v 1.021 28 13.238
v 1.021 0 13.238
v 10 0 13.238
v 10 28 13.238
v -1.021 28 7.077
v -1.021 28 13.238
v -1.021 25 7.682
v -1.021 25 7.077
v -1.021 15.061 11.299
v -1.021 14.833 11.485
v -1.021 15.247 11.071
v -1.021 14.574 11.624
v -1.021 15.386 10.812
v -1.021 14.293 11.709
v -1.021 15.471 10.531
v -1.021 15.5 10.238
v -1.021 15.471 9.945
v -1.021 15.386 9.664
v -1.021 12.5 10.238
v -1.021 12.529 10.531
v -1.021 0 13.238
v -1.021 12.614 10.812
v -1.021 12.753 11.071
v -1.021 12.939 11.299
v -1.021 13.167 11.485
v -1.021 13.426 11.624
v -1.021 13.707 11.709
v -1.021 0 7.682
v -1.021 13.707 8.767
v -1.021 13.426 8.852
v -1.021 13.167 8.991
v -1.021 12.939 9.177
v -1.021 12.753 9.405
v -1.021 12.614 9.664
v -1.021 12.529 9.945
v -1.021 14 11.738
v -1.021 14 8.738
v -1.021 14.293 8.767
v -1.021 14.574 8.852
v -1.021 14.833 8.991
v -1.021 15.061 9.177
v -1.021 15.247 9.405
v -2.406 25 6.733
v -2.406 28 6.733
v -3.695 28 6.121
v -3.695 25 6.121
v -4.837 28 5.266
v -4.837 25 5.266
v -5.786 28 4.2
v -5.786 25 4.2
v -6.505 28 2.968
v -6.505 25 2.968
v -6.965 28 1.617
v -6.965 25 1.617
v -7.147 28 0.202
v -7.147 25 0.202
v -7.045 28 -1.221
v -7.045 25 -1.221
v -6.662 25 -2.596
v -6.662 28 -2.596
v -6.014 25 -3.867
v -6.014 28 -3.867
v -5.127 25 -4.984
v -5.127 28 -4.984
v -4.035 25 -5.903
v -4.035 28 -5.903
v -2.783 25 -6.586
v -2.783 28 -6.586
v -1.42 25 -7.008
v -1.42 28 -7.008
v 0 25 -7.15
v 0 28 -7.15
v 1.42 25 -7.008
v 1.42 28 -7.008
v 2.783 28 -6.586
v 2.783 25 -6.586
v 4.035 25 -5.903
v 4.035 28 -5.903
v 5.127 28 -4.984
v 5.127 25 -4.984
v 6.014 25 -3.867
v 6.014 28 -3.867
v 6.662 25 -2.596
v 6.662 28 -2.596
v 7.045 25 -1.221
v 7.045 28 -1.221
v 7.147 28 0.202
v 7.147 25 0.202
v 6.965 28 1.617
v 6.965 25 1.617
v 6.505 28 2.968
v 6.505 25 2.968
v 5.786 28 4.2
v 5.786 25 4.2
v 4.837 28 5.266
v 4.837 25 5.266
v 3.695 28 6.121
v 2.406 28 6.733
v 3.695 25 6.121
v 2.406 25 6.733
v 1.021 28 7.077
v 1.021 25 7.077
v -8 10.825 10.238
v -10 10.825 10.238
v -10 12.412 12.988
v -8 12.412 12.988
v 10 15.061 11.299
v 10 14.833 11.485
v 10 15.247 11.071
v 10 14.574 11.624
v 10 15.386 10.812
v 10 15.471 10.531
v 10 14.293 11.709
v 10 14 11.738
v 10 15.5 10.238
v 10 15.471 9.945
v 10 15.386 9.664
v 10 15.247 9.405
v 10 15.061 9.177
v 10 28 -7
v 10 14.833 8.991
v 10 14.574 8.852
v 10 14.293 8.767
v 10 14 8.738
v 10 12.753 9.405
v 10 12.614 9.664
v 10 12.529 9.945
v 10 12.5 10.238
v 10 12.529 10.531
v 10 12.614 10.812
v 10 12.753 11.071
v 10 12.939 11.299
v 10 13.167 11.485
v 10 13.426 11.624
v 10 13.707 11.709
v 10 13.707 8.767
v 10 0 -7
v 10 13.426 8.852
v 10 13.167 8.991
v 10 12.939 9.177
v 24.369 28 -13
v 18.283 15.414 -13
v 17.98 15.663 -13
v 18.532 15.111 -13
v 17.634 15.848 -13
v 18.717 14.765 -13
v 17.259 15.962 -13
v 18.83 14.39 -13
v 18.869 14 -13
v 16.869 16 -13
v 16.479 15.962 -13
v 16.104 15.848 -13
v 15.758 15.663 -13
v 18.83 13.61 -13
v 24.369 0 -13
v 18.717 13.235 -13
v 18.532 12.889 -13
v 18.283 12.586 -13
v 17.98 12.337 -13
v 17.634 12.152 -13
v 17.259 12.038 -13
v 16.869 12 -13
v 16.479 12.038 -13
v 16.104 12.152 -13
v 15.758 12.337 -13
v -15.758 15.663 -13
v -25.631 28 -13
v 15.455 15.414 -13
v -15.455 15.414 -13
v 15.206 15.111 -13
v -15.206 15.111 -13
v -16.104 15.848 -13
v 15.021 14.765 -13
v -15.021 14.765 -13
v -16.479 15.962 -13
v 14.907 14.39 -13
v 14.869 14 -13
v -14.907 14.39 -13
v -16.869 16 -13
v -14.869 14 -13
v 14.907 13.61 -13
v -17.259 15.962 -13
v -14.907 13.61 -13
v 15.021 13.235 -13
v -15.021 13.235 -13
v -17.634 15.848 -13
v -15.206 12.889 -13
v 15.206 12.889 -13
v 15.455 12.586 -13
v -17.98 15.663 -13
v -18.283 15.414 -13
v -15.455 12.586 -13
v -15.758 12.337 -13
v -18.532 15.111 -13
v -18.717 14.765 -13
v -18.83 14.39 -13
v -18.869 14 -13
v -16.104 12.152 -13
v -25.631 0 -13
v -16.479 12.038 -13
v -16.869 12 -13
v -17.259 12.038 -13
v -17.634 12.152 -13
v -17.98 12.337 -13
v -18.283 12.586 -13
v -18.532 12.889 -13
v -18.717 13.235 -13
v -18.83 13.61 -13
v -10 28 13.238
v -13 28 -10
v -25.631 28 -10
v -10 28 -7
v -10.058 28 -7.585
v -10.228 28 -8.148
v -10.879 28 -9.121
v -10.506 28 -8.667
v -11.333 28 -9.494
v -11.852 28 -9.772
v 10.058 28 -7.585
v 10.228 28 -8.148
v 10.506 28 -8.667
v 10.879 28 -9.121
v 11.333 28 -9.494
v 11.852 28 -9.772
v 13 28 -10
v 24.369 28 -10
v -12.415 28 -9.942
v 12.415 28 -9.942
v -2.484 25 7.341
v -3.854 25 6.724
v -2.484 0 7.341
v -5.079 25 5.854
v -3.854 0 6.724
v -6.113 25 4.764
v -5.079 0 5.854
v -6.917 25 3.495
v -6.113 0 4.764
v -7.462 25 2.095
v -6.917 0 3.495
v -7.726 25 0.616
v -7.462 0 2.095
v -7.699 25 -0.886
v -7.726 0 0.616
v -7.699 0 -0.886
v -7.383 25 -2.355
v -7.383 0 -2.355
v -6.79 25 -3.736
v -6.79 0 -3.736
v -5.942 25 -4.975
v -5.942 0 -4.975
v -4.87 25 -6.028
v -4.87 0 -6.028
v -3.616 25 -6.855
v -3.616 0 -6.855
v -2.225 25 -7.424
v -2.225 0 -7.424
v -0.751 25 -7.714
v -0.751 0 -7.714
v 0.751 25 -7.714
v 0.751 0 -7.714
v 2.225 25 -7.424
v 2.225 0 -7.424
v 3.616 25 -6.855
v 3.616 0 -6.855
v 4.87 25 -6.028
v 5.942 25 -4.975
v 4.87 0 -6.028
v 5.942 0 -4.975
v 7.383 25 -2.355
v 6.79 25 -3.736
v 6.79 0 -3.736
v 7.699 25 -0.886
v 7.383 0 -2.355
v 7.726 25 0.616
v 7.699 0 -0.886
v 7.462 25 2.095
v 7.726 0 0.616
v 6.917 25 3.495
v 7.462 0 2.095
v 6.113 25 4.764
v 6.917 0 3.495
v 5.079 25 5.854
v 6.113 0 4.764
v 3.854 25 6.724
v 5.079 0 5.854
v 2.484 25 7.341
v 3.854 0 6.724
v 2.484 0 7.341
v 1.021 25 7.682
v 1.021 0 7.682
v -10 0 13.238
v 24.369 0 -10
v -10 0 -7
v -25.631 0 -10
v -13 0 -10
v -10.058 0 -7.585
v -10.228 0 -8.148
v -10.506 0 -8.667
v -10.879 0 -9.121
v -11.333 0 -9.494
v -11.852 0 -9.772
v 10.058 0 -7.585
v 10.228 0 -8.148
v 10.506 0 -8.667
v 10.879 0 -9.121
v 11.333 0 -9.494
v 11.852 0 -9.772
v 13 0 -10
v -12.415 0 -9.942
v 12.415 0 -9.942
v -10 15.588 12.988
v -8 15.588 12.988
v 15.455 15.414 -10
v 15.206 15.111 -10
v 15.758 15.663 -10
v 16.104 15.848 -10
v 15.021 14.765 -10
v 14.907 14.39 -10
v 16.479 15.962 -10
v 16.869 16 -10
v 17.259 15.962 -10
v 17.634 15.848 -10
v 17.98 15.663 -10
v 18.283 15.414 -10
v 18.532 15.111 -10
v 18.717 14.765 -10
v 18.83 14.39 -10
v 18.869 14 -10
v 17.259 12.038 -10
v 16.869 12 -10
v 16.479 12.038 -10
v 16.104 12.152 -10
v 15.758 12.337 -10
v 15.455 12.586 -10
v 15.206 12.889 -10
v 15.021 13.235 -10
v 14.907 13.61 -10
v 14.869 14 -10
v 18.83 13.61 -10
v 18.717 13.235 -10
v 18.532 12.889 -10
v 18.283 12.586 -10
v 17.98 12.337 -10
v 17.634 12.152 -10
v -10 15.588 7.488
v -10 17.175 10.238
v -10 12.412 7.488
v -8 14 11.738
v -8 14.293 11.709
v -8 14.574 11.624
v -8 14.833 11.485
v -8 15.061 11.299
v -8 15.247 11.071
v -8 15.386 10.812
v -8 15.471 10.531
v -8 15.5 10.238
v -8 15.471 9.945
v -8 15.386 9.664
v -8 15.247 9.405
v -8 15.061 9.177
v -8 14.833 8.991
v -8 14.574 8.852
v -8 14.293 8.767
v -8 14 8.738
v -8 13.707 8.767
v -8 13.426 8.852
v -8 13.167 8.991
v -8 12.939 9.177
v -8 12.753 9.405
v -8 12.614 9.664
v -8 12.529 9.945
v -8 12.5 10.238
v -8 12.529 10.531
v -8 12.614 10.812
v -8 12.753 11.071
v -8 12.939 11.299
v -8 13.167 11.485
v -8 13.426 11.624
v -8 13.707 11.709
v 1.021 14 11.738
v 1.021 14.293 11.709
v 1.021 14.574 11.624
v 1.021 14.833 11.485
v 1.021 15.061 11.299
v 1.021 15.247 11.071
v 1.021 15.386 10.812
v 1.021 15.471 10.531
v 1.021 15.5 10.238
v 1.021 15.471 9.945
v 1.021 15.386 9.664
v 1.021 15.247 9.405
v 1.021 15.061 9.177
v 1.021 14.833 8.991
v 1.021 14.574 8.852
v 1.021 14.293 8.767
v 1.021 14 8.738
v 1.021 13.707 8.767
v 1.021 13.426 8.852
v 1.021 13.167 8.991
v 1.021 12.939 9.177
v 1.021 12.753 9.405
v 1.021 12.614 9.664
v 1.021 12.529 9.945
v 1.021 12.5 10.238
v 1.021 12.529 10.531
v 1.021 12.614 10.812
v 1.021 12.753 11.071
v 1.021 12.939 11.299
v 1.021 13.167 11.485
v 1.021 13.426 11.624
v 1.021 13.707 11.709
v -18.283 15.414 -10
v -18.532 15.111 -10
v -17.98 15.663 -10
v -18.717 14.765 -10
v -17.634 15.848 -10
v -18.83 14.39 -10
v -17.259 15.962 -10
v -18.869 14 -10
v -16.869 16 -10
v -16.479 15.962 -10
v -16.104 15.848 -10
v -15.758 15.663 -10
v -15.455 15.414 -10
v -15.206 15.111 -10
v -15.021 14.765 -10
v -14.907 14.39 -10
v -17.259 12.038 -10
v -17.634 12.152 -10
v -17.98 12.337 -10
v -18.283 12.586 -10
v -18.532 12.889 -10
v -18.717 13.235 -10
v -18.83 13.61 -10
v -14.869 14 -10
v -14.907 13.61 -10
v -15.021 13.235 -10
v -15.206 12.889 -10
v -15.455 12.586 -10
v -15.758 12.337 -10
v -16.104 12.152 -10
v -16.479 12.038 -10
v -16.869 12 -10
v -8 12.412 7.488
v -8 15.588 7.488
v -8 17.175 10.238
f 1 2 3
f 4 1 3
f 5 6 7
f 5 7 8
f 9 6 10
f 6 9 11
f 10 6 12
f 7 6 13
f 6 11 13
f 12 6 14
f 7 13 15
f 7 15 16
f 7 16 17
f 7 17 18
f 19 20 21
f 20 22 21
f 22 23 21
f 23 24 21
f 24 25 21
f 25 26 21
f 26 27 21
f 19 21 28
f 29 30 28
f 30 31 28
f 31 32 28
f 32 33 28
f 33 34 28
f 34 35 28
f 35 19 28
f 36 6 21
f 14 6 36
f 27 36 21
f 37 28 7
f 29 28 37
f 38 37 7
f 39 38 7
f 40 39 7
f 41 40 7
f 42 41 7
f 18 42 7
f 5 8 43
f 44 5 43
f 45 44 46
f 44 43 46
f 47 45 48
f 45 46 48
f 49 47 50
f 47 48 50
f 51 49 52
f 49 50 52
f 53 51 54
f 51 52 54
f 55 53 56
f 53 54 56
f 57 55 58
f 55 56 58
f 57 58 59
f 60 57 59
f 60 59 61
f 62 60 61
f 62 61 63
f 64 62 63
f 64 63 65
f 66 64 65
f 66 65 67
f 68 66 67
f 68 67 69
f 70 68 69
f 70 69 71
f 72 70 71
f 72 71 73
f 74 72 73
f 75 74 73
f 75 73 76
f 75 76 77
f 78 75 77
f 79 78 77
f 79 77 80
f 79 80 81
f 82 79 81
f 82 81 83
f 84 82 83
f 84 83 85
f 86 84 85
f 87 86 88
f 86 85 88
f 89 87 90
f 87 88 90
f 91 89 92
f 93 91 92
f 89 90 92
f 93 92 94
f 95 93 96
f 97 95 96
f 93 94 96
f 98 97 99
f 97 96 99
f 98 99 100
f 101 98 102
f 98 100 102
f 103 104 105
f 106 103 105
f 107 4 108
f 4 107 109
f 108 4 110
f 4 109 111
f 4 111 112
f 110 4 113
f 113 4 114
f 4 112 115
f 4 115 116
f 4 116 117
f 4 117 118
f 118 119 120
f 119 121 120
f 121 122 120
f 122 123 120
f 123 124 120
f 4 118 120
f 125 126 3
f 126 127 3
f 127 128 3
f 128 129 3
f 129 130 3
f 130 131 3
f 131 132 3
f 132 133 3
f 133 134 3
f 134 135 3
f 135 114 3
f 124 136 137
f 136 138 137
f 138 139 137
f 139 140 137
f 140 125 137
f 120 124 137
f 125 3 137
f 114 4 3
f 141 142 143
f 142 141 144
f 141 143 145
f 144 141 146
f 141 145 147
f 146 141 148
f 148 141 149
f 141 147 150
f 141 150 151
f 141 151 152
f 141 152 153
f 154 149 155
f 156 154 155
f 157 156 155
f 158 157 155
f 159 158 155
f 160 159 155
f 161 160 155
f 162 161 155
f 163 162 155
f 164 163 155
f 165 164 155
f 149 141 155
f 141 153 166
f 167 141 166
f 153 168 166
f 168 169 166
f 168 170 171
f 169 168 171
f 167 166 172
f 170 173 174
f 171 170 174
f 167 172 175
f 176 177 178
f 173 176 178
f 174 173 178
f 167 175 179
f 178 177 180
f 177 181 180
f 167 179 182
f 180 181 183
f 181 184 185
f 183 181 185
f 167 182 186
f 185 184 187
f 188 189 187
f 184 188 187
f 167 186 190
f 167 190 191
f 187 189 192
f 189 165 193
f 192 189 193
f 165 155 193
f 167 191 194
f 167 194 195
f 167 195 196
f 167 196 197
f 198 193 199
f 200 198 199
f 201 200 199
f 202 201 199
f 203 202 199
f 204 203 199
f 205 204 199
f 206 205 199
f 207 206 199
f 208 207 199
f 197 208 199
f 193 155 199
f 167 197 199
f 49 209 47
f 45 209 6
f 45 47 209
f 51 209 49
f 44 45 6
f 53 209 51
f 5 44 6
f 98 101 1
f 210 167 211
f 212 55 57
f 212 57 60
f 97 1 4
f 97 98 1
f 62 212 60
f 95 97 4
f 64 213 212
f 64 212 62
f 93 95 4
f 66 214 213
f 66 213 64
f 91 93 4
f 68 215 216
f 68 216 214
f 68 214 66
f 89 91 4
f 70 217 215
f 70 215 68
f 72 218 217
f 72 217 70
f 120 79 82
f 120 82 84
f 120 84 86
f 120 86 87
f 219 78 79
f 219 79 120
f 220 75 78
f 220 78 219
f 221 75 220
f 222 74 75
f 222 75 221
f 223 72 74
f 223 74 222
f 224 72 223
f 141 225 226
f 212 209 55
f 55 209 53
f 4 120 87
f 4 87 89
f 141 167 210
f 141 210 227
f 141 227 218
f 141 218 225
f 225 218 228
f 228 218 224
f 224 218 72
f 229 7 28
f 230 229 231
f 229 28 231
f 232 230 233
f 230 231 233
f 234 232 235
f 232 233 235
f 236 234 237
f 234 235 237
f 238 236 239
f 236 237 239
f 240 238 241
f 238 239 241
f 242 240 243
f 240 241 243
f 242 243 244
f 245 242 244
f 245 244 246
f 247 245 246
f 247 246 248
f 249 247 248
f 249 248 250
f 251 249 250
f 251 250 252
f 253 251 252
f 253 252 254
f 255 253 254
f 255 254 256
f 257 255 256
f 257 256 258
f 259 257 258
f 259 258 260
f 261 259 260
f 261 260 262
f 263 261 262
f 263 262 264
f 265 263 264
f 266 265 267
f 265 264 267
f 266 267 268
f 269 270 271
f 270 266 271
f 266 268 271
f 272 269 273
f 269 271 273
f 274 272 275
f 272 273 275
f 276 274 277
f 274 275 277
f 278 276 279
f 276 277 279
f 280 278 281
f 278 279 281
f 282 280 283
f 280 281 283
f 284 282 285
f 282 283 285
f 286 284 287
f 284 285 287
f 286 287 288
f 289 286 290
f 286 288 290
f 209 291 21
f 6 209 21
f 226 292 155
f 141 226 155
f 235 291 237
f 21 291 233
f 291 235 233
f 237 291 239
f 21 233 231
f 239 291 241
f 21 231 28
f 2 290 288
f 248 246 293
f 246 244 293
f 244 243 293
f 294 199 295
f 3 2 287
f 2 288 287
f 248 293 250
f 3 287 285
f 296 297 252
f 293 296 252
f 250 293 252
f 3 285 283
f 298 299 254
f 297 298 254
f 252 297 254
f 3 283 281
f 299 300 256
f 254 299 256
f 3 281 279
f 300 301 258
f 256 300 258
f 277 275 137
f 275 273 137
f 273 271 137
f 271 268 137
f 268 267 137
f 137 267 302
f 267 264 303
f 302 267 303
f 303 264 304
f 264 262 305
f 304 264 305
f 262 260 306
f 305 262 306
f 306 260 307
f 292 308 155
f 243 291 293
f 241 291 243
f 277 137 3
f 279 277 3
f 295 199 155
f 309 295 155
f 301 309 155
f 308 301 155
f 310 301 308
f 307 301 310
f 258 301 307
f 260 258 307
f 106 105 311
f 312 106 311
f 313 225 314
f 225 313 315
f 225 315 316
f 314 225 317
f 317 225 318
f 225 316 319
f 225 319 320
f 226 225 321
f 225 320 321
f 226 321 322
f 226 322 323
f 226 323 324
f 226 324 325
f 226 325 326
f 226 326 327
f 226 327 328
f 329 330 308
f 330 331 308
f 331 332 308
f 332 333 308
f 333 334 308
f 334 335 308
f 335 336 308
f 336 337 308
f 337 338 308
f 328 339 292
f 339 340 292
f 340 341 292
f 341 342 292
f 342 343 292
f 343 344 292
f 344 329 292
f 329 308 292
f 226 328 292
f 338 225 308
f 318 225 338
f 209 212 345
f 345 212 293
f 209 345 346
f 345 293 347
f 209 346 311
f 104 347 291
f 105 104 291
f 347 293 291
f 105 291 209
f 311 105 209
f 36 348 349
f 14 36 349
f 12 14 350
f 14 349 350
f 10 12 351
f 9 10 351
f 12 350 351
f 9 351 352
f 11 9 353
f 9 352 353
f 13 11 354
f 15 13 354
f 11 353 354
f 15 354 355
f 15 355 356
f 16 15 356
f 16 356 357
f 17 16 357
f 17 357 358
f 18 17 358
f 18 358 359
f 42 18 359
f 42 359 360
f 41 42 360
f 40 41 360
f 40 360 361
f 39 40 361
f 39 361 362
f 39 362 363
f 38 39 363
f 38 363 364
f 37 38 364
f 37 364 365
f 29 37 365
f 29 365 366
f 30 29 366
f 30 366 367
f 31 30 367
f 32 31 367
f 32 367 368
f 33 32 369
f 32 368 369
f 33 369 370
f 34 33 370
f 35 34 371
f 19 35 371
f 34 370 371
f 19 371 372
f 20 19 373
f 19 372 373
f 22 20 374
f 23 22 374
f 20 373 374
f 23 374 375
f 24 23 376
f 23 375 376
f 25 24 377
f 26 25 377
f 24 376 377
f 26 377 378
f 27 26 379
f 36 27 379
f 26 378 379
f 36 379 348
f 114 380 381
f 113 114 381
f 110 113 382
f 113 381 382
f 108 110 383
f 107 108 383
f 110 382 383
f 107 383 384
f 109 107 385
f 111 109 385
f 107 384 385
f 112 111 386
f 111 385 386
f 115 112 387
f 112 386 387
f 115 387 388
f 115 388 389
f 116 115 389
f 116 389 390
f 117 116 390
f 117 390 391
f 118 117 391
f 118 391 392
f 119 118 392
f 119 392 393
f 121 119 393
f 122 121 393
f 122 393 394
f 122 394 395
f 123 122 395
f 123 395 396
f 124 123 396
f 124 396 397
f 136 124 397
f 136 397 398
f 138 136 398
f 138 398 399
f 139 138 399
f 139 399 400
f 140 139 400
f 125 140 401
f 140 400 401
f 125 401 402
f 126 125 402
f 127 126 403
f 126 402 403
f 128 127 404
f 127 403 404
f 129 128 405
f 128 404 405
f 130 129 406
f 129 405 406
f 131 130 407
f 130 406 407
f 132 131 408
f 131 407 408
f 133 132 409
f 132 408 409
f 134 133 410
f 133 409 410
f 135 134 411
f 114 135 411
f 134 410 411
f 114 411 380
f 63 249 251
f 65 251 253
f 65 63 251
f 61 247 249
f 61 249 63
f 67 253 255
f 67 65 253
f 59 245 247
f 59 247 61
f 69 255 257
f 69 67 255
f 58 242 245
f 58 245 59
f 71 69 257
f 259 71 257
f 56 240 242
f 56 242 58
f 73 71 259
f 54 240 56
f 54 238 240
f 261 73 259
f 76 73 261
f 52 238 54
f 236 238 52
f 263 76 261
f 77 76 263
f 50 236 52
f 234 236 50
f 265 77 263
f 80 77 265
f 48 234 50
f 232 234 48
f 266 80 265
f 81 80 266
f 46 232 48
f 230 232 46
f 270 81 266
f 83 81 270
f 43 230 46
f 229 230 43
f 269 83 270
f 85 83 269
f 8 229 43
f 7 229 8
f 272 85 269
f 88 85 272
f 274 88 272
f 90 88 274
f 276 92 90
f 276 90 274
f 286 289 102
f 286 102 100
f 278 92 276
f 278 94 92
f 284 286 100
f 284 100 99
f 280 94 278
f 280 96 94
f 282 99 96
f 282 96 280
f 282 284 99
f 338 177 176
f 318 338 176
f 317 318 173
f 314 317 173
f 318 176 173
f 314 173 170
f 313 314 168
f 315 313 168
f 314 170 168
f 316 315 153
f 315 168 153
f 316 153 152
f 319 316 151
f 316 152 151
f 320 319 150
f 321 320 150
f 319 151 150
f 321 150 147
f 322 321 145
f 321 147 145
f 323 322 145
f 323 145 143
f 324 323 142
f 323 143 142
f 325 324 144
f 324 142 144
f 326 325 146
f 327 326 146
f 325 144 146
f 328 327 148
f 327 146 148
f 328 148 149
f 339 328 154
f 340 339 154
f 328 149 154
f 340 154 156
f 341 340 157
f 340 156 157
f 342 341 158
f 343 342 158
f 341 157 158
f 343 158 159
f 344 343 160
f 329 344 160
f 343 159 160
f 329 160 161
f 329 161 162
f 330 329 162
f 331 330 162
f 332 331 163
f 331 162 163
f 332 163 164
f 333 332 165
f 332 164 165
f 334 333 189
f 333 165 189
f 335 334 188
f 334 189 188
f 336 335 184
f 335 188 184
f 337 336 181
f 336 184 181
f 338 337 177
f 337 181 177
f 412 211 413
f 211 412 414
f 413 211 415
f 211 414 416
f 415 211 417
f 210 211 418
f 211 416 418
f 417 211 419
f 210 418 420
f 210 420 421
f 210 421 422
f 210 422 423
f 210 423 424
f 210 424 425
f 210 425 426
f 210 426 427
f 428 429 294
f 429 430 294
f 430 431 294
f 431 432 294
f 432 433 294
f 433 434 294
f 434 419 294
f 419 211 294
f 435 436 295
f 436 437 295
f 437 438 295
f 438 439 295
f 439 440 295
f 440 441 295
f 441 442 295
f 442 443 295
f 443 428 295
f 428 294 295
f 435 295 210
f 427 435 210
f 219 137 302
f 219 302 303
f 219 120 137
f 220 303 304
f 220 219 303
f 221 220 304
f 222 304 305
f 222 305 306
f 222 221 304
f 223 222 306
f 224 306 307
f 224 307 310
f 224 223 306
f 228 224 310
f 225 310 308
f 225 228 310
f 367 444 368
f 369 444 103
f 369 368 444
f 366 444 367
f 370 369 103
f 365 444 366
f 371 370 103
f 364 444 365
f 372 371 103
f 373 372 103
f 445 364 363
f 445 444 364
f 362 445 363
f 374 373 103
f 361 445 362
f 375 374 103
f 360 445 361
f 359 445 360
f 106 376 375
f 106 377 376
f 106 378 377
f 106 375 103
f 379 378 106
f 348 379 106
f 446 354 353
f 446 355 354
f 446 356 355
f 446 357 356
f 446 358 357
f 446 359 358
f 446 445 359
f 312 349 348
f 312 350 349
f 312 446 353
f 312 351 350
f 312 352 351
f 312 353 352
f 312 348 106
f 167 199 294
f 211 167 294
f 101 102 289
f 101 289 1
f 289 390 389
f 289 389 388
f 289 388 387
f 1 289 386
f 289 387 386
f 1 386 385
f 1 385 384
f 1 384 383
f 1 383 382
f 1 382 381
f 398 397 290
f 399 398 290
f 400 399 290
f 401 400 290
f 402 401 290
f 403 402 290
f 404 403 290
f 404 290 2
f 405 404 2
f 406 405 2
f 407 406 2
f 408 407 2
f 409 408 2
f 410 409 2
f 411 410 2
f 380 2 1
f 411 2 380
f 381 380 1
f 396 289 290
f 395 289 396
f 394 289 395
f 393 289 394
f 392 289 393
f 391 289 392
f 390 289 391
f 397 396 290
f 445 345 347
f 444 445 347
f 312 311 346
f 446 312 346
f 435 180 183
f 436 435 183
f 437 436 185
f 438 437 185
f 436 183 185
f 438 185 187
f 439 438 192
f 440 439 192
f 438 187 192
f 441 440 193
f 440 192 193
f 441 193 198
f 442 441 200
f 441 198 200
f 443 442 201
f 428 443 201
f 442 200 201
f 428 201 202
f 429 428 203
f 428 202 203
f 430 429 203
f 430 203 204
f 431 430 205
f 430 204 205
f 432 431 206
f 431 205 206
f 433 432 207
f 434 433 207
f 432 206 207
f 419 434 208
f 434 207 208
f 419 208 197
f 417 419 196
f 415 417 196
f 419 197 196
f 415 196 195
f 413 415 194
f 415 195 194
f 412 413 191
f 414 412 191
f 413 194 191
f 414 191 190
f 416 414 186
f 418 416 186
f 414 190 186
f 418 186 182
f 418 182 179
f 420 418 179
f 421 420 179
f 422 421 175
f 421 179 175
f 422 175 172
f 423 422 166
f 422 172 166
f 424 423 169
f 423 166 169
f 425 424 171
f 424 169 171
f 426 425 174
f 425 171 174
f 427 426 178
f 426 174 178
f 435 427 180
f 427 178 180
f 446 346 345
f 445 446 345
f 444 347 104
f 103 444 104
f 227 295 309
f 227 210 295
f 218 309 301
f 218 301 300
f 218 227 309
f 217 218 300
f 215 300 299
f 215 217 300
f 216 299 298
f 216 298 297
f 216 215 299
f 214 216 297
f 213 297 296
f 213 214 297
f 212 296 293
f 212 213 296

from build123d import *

# Parameters (mm, degrees)
BOSS_EXTRUDE1_DEPTH = 28
SKETCH2_R           = 1.5
CUT_EXTRUDE1_DEPTH  = 20
CUT_EXTRUDE2_DEPTH  = 2
SKETCH4_R           = 2
CUT_EXTRUDE3_DEPTH  = 3
FILLET1_R           = 3
FILLET2_R           = 3
SKETCH5_R           = 7.75
CUT_EXTRUDE4_DEPTH  = 25


with BuildPart() as part:
    # Sketch1 → Boss-Extrude1 (new body)
    with BuildSketch(Plane(origin=(0, 0, 0), x_dir=(1, 0, 0), z_dir=(0, 1, 0))):
        with BuildLine():
            Line((-25.631117397, 10), (-10, 10))
            Line((-10, 10), (-10, -13.238049007))
            Line((-10, -13.238049007), (-1.021428571, -13.238049007))
            Line((-1.021428571, -13.238049007), (-1.021428571, -7.076664728))
            ThreePointArc((-1.021428571, -7.076664728), (0, 7.15), (1.021428571, -7.076664728))
            Line((1.021428571, -7.076664728), (1.021428571, -13.238049007))
            Line((1.021428571, -13.238049007), (10, -13.238049007))
            Line((10, -13.238049007), (10, 10))
            Line((10, 10), (24.368882603, 10))
            Line((24.368882603, 10), (24.368882603, 13))
            Line((24.368882603, 13), (-25.631117397, 13))
            Line((-25.631117397, 13), (-25.631117397, 10))
        make_face()
    extrude(amount=BOSS_EXTRUDE1_DEPTH)

    # Sketch2 → Cut-Extrude1 (cut)
    with BuildSketch(Plane.ZY.offset(10)):
        with Locations((10.238049007, 14)):
            Circle(SKETCH2_R)
    extrude(amount=-CUT_EXTRUDE1_DEPTH, mode=Mode.SUBTRACT)

    # Sketch3 → Cut-Extrude2 (cut)
    with BuildSketch(Plane.ZY.offset(10)):
        Polygon((10.238049007, 17.175426481), (7.488049007, 15.58771324), (7.488049007, 12.41228676), (10.238049007, 10.824573519), (12.988049007, 12.41228676), (12.988049007, 15.58771324), align=None)
    extrude(amount=-CUT_EXTRUDE2_DEPTH, mode=Mode.SUBTRACT)

    # Sketch4 → Cut-Extrude3 (cut)
    with BuildSketch(Plane(origin=(0, 0, -13), x_dir=(-1, 0, 0), z_dir=(0, 0, -1))):
        with Locations((-16.868882603, 14)):
            Circle(SKETCH4_R)
        with Locations(Location((16.868882603, 14, 0), (0, 0, 180))):
            Circle(SKETCH4_R)
    extrude(amount=-CUT_EXTRUDE3_DEPTH, mode=Mode.SUBTRACT)

    # Fillet1
    fillet1_edges = [part.edges().sort_by_distance(p)[0] for p in [
        (10, 14, -10),
    ]]
    fillet(fillet1_edges, radius=FILLET1_R)

    # Fillet2
    fillet2_edges = [part.edges().sort_by_distance(p)[0] for p in [
        (-10, 14, -10),
    ]]
    fillet(fillet2_edges, radius=FILLET2_R)

    # Sketch5 → Cut-Extrude4 (cut)
    with BuildSketch(Plane.XZ):
        Circle(SKETCH5_R)
    extrude(amount=-CUT_EXTRUDE4_DEPTH, mode=Mode.SUBTRACT)


solid = part.part
